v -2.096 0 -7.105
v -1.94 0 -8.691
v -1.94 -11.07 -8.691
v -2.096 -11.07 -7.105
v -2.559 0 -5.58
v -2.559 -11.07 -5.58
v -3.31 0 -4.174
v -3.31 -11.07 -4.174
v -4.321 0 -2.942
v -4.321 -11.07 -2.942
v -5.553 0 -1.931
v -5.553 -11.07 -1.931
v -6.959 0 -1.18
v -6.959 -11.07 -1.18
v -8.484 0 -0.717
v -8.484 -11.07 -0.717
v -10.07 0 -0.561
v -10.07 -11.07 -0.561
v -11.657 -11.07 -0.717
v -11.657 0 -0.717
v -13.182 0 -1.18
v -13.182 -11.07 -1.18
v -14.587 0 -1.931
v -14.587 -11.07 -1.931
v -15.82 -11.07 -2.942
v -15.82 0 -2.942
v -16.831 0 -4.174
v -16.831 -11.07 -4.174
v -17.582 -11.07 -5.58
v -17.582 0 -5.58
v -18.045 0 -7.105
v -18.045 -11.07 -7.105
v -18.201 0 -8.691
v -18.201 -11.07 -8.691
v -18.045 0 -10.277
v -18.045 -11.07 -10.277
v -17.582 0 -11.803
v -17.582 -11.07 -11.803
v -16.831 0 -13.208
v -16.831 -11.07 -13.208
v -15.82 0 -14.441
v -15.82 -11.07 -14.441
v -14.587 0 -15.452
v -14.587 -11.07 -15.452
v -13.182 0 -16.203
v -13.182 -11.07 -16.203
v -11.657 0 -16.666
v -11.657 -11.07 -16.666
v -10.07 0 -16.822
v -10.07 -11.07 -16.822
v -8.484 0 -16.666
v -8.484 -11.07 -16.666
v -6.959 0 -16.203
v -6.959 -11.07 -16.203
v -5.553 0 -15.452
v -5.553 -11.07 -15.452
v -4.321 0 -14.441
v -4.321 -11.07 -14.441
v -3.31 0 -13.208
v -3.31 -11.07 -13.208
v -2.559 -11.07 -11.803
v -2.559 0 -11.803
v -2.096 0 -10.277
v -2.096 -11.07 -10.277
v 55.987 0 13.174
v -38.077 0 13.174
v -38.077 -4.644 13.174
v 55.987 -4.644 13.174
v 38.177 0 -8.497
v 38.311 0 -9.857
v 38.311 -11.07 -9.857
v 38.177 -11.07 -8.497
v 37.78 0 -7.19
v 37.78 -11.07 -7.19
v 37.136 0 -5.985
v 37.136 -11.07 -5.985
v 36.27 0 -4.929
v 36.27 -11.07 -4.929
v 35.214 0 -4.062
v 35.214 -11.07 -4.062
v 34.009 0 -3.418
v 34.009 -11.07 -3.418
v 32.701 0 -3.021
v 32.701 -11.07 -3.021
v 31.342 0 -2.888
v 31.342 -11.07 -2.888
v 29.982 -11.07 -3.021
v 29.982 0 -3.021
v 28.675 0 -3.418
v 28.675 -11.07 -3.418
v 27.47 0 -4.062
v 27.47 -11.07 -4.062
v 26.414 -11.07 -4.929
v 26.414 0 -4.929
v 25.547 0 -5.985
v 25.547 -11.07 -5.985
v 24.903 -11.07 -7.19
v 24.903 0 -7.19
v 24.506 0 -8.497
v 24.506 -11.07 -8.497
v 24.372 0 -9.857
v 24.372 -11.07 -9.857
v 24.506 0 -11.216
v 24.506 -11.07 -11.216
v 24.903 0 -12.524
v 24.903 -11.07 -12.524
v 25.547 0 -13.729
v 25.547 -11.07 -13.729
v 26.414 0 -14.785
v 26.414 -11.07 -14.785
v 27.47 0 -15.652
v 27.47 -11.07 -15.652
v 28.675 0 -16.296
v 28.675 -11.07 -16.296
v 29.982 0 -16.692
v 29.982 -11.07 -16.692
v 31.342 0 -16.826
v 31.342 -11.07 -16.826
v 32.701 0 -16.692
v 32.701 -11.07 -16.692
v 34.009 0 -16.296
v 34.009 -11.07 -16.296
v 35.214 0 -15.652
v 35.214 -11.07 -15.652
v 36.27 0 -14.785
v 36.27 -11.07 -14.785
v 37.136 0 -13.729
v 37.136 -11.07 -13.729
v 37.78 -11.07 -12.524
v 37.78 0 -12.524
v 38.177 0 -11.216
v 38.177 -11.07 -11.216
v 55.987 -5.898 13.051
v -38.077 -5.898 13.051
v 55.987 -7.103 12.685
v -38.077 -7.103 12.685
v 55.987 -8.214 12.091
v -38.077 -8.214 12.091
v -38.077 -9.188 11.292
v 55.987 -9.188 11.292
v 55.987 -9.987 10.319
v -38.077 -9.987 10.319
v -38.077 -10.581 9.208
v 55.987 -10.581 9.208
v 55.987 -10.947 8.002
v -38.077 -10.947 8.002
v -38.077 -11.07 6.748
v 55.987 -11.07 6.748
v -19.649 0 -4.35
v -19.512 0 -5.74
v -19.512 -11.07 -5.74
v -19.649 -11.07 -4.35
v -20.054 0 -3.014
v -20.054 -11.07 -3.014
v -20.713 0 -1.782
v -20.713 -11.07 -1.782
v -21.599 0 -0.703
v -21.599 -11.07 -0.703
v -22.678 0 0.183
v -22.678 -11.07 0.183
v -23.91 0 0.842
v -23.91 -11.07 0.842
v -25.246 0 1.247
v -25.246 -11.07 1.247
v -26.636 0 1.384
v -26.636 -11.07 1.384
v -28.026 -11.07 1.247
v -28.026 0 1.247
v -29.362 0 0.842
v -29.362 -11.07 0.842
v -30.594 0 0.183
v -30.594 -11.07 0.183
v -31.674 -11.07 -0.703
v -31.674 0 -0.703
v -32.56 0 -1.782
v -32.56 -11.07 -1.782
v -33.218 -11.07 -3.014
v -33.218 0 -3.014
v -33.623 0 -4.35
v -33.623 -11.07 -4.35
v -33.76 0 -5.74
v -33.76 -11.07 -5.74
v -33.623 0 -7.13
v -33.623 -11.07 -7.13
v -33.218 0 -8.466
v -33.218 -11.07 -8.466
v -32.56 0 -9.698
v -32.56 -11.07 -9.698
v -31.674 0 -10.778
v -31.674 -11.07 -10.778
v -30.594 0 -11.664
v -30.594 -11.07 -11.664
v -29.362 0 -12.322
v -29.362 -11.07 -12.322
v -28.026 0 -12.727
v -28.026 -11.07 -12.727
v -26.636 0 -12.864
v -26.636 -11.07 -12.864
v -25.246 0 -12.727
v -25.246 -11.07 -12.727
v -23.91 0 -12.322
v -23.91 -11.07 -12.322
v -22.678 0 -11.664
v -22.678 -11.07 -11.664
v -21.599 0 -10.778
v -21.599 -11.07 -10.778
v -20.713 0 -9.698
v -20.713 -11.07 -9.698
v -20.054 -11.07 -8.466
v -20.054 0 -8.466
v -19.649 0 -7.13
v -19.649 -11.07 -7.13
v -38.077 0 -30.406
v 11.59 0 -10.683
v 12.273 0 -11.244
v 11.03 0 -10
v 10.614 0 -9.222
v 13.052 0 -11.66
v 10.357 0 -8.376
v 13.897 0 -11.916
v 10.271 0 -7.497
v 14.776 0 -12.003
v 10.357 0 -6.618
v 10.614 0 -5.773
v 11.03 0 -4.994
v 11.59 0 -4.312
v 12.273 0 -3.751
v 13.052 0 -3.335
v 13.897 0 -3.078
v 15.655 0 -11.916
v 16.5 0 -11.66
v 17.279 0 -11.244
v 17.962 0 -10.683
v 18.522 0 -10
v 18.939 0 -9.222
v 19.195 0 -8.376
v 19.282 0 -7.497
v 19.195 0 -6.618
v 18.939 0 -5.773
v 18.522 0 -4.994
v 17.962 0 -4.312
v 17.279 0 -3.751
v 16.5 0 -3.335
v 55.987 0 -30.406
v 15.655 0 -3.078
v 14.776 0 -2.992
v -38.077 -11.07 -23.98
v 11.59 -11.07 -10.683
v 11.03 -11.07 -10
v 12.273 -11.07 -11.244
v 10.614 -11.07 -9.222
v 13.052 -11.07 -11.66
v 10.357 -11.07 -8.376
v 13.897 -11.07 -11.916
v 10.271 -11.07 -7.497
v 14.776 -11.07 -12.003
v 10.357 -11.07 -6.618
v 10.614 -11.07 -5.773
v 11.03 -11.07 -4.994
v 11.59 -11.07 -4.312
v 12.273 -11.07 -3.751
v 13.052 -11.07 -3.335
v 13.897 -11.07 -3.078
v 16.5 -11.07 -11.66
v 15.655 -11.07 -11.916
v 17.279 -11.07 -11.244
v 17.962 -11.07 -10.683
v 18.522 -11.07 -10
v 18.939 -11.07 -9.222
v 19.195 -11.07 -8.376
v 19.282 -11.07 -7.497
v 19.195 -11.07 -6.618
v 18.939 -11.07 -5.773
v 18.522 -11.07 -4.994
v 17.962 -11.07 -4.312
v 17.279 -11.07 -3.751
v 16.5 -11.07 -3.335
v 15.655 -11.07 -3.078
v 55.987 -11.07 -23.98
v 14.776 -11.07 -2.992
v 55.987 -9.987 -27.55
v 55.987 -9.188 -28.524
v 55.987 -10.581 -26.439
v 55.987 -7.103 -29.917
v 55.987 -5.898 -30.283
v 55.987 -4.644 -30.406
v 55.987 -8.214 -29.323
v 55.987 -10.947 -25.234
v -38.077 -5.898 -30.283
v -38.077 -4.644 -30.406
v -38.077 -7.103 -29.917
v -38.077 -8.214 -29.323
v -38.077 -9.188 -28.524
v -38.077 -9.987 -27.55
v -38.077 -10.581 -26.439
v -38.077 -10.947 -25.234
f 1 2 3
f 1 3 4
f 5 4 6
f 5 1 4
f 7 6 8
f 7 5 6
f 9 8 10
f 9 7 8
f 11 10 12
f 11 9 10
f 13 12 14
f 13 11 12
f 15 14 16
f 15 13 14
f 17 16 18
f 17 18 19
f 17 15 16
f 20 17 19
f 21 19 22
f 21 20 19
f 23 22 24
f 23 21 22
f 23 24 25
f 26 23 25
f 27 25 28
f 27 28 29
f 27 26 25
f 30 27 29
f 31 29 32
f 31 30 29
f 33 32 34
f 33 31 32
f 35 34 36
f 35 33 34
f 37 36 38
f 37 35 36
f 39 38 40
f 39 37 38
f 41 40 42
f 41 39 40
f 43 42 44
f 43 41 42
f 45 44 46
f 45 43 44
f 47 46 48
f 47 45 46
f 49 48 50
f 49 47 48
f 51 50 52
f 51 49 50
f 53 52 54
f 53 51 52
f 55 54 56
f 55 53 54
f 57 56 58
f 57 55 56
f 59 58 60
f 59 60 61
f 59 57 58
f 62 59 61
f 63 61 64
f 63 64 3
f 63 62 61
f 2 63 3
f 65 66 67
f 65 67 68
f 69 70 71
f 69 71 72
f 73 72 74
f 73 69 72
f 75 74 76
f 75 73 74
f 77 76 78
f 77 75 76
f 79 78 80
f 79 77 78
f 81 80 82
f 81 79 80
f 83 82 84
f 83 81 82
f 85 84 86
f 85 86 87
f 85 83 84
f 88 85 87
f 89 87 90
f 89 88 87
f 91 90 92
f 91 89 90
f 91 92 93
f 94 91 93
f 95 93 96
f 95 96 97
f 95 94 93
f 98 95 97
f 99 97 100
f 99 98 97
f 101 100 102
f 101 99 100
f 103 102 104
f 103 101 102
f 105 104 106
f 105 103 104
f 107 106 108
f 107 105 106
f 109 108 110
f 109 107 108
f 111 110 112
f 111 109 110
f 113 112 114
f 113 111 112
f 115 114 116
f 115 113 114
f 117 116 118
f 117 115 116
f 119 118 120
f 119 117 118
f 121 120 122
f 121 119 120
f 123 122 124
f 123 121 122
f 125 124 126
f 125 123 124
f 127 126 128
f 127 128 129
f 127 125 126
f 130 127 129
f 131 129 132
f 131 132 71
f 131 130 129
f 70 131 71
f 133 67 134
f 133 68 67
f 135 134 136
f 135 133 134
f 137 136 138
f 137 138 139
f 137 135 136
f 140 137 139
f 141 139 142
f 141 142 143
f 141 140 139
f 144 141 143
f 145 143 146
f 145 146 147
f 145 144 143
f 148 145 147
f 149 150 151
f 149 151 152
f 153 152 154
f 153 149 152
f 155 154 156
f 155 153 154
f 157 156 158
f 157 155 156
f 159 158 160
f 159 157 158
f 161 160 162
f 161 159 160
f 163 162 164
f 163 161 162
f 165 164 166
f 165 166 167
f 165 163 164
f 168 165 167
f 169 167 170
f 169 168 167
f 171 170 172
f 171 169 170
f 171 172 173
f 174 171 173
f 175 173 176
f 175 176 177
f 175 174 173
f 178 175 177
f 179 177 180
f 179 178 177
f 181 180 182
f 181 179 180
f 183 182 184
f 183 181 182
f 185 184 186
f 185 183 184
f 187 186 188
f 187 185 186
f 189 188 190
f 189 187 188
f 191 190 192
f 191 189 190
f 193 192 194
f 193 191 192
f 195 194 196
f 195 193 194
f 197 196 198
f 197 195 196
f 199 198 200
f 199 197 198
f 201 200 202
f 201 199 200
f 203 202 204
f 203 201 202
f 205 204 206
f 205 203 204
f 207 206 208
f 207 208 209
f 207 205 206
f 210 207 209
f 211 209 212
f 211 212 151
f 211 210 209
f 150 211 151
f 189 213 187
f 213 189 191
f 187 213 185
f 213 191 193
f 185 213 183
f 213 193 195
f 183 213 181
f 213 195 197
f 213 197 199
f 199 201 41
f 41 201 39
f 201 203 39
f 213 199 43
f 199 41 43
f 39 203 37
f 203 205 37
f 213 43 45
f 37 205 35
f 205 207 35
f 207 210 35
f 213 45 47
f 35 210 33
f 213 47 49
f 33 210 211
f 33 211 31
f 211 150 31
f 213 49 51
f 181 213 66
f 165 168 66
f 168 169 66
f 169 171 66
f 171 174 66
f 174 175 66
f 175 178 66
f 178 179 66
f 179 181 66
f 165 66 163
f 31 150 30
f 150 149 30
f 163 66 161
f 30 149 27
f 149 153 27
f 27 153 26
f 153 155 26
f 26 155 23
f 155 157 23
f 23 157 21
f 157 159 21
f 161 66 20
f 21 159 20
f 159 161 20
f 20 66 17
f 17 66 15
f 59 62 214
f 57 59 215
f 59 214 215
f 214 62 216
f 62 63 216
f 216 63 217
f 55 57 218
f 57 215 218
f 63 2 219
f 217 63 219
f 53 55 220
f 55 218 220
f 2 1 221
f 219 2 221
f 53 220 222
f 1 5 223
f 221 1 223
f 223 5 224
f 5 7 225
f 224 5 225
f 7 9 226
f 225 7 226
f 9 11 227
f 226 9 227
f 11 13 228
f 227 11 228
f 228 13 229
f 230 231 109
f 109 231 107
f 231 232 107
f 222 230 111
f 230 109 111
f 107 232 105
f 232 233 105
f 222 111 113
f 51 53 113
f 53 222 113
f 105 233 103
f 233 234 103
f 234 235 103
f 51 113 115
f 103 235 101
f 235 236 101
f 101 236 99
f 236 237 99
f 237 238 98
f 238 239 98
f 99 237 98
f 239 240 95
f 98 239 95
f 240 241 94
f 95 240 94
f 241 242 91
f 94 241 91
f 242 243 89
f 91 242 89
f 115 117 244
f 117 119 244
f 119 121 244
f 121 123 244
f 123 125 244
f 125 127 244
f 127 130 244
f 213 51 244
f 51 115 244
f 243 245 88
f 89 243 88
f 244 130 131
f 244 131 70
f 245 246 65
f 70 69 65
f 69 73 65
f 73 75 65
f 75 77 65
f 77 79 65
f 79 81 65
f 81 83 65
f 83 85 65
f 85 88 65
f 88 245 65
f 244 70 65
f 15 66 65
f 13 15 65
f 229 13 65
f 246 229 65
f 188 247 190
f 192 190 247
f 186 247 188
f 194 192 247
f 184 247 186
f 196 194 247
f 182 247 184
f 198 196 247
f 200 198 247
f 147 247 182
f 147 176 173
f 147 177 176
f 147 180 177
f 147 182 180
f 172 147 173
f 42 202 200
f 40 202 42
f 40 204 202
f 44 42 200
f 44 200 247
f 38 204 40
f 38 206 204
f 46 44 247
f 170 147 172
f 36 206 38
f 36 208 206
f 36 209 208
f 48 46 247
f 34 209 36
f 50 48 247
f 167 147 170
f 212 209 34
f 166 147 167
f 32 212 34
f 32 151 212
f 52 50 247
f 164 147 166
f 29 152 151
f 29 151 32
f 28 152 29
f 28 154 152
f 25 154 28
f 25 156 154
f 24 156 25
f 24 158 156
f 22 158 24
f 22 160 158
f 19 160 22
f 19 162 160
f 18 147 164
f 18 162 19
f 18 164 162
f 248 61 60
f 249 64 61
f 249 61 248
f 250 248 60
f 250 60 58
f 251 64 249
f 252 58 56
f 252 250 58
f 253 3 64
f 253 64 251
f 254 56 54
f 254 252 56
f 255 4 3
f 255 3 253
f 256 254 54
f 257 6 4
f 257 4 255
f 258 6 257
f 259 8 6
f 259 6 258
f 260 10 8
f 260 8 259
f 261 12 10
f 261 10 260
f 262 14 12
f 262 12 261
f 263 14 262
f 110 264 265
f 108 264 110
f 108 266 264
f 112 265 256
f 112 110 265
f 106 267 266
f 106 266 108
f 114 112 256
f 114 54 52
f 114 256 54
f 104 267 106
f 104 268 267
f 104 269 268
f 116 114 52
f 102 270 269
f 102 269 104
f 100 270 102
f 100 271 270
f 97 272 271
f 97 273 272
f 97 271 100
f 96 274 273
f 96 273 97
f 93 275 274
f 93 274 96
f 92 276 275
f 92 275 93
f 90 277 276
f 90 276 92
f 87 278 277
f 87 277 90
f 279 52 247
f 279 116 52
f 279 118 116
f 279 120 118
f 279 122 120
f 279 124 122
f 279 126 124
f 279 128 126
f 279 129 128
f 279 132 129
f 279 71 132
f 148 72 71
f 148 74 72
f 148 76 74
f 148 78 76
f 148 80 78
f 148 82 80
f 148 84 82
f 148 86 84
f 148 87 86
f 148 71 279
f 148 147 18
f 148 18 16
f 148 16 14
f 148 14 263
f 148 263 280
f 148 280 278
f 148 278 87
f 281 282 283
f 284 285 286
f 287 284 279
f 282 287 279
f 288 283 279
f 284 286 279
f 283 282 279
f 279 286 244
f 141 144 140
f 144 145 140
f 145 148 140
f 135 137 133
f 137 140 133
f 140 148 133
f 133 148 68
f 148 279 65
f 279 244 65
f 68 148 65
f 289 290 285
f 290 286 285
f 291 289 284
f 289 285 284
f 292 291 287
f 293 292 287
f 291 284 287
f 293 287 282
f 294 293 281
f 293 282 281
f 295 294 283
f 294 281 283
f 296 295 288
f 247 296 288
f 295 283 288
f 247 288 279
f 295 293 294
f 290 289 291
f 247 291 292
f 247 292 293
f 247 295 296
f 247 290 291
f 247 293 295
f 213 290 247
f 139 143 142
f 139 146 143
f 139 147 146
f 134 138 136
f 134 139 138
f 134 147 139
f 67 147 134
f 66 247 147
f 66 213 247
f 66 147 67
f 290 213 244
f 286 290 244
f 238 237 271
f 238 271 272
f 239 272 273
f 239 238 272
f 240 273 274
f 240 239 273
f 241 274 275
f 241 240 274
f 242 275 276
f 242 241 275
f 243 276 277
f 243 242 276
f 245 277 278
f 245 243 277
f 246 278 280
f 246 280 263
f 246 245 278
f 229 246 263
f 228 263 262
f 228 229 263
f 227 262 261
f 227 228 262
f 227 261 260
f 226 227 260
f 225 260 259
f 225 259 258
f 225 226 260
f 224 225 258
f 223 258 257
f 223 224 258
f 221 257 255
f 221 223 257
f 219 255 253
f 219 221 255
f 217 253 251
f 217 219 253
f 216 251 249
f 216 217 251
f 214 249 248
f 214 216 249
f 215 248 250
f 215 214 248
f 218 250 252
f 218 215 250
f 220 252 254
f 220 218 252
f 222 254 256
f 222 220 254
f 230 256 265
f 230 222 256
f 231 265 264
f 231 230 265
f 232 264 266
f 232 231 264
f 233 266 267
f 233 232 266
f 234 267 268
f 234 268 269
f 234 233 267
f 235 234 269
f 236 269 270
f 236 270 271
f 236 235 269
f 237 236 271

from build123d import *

# Parameters (mm, degrees)
F0_W     = 94.063151
F0_H     = 43.580622
F1_DEPTH = 11.07007
F2_R     = 6.969276
F2_R_2   = 4.505481
F2_R_3   = 8.13069
F2_R_4   = 7.123996
F3_DEPTH = 11.07007
F4_R     = 6.425985


with BuildPart() as f1:
    # F0 (on Front) → F1 (new body)
    with BuildSketch(Plane.XZ):
        with Locations((8.955018, -8.615909)):
            Rectangle(F0_W, F0_H)
    extrude(amount=F1_DEPTH)

    # F2 (on Front) → F3 (cut, through all)
    with BuildSketch(Plane.XZ):
        with Locations((31.341657, -9.856824)):
            Circle(F2_R)
        with Locations((14.776061, -7.497377)):
            Circle(F2_R_2)
        with Locations((-10.0703, -8.691281)):
            Circle(F2_R_3)
        with Locations((-26.636144, -5.740199)):
            Circle(F2_R_4)
    extrude(amount=F3_DEPTH, mode=Mode.SUBTRACT)

    # F4
    f4_edges = [f1.edges().sort_by_distance(p)[0] for p in [
        (8.955019, -11.07007, 13.174402),
        (8.955019, -11.07007, -30.40622),
    ]]
    fillet(f4_edges, radius=F4_R)


solid = f1.part
